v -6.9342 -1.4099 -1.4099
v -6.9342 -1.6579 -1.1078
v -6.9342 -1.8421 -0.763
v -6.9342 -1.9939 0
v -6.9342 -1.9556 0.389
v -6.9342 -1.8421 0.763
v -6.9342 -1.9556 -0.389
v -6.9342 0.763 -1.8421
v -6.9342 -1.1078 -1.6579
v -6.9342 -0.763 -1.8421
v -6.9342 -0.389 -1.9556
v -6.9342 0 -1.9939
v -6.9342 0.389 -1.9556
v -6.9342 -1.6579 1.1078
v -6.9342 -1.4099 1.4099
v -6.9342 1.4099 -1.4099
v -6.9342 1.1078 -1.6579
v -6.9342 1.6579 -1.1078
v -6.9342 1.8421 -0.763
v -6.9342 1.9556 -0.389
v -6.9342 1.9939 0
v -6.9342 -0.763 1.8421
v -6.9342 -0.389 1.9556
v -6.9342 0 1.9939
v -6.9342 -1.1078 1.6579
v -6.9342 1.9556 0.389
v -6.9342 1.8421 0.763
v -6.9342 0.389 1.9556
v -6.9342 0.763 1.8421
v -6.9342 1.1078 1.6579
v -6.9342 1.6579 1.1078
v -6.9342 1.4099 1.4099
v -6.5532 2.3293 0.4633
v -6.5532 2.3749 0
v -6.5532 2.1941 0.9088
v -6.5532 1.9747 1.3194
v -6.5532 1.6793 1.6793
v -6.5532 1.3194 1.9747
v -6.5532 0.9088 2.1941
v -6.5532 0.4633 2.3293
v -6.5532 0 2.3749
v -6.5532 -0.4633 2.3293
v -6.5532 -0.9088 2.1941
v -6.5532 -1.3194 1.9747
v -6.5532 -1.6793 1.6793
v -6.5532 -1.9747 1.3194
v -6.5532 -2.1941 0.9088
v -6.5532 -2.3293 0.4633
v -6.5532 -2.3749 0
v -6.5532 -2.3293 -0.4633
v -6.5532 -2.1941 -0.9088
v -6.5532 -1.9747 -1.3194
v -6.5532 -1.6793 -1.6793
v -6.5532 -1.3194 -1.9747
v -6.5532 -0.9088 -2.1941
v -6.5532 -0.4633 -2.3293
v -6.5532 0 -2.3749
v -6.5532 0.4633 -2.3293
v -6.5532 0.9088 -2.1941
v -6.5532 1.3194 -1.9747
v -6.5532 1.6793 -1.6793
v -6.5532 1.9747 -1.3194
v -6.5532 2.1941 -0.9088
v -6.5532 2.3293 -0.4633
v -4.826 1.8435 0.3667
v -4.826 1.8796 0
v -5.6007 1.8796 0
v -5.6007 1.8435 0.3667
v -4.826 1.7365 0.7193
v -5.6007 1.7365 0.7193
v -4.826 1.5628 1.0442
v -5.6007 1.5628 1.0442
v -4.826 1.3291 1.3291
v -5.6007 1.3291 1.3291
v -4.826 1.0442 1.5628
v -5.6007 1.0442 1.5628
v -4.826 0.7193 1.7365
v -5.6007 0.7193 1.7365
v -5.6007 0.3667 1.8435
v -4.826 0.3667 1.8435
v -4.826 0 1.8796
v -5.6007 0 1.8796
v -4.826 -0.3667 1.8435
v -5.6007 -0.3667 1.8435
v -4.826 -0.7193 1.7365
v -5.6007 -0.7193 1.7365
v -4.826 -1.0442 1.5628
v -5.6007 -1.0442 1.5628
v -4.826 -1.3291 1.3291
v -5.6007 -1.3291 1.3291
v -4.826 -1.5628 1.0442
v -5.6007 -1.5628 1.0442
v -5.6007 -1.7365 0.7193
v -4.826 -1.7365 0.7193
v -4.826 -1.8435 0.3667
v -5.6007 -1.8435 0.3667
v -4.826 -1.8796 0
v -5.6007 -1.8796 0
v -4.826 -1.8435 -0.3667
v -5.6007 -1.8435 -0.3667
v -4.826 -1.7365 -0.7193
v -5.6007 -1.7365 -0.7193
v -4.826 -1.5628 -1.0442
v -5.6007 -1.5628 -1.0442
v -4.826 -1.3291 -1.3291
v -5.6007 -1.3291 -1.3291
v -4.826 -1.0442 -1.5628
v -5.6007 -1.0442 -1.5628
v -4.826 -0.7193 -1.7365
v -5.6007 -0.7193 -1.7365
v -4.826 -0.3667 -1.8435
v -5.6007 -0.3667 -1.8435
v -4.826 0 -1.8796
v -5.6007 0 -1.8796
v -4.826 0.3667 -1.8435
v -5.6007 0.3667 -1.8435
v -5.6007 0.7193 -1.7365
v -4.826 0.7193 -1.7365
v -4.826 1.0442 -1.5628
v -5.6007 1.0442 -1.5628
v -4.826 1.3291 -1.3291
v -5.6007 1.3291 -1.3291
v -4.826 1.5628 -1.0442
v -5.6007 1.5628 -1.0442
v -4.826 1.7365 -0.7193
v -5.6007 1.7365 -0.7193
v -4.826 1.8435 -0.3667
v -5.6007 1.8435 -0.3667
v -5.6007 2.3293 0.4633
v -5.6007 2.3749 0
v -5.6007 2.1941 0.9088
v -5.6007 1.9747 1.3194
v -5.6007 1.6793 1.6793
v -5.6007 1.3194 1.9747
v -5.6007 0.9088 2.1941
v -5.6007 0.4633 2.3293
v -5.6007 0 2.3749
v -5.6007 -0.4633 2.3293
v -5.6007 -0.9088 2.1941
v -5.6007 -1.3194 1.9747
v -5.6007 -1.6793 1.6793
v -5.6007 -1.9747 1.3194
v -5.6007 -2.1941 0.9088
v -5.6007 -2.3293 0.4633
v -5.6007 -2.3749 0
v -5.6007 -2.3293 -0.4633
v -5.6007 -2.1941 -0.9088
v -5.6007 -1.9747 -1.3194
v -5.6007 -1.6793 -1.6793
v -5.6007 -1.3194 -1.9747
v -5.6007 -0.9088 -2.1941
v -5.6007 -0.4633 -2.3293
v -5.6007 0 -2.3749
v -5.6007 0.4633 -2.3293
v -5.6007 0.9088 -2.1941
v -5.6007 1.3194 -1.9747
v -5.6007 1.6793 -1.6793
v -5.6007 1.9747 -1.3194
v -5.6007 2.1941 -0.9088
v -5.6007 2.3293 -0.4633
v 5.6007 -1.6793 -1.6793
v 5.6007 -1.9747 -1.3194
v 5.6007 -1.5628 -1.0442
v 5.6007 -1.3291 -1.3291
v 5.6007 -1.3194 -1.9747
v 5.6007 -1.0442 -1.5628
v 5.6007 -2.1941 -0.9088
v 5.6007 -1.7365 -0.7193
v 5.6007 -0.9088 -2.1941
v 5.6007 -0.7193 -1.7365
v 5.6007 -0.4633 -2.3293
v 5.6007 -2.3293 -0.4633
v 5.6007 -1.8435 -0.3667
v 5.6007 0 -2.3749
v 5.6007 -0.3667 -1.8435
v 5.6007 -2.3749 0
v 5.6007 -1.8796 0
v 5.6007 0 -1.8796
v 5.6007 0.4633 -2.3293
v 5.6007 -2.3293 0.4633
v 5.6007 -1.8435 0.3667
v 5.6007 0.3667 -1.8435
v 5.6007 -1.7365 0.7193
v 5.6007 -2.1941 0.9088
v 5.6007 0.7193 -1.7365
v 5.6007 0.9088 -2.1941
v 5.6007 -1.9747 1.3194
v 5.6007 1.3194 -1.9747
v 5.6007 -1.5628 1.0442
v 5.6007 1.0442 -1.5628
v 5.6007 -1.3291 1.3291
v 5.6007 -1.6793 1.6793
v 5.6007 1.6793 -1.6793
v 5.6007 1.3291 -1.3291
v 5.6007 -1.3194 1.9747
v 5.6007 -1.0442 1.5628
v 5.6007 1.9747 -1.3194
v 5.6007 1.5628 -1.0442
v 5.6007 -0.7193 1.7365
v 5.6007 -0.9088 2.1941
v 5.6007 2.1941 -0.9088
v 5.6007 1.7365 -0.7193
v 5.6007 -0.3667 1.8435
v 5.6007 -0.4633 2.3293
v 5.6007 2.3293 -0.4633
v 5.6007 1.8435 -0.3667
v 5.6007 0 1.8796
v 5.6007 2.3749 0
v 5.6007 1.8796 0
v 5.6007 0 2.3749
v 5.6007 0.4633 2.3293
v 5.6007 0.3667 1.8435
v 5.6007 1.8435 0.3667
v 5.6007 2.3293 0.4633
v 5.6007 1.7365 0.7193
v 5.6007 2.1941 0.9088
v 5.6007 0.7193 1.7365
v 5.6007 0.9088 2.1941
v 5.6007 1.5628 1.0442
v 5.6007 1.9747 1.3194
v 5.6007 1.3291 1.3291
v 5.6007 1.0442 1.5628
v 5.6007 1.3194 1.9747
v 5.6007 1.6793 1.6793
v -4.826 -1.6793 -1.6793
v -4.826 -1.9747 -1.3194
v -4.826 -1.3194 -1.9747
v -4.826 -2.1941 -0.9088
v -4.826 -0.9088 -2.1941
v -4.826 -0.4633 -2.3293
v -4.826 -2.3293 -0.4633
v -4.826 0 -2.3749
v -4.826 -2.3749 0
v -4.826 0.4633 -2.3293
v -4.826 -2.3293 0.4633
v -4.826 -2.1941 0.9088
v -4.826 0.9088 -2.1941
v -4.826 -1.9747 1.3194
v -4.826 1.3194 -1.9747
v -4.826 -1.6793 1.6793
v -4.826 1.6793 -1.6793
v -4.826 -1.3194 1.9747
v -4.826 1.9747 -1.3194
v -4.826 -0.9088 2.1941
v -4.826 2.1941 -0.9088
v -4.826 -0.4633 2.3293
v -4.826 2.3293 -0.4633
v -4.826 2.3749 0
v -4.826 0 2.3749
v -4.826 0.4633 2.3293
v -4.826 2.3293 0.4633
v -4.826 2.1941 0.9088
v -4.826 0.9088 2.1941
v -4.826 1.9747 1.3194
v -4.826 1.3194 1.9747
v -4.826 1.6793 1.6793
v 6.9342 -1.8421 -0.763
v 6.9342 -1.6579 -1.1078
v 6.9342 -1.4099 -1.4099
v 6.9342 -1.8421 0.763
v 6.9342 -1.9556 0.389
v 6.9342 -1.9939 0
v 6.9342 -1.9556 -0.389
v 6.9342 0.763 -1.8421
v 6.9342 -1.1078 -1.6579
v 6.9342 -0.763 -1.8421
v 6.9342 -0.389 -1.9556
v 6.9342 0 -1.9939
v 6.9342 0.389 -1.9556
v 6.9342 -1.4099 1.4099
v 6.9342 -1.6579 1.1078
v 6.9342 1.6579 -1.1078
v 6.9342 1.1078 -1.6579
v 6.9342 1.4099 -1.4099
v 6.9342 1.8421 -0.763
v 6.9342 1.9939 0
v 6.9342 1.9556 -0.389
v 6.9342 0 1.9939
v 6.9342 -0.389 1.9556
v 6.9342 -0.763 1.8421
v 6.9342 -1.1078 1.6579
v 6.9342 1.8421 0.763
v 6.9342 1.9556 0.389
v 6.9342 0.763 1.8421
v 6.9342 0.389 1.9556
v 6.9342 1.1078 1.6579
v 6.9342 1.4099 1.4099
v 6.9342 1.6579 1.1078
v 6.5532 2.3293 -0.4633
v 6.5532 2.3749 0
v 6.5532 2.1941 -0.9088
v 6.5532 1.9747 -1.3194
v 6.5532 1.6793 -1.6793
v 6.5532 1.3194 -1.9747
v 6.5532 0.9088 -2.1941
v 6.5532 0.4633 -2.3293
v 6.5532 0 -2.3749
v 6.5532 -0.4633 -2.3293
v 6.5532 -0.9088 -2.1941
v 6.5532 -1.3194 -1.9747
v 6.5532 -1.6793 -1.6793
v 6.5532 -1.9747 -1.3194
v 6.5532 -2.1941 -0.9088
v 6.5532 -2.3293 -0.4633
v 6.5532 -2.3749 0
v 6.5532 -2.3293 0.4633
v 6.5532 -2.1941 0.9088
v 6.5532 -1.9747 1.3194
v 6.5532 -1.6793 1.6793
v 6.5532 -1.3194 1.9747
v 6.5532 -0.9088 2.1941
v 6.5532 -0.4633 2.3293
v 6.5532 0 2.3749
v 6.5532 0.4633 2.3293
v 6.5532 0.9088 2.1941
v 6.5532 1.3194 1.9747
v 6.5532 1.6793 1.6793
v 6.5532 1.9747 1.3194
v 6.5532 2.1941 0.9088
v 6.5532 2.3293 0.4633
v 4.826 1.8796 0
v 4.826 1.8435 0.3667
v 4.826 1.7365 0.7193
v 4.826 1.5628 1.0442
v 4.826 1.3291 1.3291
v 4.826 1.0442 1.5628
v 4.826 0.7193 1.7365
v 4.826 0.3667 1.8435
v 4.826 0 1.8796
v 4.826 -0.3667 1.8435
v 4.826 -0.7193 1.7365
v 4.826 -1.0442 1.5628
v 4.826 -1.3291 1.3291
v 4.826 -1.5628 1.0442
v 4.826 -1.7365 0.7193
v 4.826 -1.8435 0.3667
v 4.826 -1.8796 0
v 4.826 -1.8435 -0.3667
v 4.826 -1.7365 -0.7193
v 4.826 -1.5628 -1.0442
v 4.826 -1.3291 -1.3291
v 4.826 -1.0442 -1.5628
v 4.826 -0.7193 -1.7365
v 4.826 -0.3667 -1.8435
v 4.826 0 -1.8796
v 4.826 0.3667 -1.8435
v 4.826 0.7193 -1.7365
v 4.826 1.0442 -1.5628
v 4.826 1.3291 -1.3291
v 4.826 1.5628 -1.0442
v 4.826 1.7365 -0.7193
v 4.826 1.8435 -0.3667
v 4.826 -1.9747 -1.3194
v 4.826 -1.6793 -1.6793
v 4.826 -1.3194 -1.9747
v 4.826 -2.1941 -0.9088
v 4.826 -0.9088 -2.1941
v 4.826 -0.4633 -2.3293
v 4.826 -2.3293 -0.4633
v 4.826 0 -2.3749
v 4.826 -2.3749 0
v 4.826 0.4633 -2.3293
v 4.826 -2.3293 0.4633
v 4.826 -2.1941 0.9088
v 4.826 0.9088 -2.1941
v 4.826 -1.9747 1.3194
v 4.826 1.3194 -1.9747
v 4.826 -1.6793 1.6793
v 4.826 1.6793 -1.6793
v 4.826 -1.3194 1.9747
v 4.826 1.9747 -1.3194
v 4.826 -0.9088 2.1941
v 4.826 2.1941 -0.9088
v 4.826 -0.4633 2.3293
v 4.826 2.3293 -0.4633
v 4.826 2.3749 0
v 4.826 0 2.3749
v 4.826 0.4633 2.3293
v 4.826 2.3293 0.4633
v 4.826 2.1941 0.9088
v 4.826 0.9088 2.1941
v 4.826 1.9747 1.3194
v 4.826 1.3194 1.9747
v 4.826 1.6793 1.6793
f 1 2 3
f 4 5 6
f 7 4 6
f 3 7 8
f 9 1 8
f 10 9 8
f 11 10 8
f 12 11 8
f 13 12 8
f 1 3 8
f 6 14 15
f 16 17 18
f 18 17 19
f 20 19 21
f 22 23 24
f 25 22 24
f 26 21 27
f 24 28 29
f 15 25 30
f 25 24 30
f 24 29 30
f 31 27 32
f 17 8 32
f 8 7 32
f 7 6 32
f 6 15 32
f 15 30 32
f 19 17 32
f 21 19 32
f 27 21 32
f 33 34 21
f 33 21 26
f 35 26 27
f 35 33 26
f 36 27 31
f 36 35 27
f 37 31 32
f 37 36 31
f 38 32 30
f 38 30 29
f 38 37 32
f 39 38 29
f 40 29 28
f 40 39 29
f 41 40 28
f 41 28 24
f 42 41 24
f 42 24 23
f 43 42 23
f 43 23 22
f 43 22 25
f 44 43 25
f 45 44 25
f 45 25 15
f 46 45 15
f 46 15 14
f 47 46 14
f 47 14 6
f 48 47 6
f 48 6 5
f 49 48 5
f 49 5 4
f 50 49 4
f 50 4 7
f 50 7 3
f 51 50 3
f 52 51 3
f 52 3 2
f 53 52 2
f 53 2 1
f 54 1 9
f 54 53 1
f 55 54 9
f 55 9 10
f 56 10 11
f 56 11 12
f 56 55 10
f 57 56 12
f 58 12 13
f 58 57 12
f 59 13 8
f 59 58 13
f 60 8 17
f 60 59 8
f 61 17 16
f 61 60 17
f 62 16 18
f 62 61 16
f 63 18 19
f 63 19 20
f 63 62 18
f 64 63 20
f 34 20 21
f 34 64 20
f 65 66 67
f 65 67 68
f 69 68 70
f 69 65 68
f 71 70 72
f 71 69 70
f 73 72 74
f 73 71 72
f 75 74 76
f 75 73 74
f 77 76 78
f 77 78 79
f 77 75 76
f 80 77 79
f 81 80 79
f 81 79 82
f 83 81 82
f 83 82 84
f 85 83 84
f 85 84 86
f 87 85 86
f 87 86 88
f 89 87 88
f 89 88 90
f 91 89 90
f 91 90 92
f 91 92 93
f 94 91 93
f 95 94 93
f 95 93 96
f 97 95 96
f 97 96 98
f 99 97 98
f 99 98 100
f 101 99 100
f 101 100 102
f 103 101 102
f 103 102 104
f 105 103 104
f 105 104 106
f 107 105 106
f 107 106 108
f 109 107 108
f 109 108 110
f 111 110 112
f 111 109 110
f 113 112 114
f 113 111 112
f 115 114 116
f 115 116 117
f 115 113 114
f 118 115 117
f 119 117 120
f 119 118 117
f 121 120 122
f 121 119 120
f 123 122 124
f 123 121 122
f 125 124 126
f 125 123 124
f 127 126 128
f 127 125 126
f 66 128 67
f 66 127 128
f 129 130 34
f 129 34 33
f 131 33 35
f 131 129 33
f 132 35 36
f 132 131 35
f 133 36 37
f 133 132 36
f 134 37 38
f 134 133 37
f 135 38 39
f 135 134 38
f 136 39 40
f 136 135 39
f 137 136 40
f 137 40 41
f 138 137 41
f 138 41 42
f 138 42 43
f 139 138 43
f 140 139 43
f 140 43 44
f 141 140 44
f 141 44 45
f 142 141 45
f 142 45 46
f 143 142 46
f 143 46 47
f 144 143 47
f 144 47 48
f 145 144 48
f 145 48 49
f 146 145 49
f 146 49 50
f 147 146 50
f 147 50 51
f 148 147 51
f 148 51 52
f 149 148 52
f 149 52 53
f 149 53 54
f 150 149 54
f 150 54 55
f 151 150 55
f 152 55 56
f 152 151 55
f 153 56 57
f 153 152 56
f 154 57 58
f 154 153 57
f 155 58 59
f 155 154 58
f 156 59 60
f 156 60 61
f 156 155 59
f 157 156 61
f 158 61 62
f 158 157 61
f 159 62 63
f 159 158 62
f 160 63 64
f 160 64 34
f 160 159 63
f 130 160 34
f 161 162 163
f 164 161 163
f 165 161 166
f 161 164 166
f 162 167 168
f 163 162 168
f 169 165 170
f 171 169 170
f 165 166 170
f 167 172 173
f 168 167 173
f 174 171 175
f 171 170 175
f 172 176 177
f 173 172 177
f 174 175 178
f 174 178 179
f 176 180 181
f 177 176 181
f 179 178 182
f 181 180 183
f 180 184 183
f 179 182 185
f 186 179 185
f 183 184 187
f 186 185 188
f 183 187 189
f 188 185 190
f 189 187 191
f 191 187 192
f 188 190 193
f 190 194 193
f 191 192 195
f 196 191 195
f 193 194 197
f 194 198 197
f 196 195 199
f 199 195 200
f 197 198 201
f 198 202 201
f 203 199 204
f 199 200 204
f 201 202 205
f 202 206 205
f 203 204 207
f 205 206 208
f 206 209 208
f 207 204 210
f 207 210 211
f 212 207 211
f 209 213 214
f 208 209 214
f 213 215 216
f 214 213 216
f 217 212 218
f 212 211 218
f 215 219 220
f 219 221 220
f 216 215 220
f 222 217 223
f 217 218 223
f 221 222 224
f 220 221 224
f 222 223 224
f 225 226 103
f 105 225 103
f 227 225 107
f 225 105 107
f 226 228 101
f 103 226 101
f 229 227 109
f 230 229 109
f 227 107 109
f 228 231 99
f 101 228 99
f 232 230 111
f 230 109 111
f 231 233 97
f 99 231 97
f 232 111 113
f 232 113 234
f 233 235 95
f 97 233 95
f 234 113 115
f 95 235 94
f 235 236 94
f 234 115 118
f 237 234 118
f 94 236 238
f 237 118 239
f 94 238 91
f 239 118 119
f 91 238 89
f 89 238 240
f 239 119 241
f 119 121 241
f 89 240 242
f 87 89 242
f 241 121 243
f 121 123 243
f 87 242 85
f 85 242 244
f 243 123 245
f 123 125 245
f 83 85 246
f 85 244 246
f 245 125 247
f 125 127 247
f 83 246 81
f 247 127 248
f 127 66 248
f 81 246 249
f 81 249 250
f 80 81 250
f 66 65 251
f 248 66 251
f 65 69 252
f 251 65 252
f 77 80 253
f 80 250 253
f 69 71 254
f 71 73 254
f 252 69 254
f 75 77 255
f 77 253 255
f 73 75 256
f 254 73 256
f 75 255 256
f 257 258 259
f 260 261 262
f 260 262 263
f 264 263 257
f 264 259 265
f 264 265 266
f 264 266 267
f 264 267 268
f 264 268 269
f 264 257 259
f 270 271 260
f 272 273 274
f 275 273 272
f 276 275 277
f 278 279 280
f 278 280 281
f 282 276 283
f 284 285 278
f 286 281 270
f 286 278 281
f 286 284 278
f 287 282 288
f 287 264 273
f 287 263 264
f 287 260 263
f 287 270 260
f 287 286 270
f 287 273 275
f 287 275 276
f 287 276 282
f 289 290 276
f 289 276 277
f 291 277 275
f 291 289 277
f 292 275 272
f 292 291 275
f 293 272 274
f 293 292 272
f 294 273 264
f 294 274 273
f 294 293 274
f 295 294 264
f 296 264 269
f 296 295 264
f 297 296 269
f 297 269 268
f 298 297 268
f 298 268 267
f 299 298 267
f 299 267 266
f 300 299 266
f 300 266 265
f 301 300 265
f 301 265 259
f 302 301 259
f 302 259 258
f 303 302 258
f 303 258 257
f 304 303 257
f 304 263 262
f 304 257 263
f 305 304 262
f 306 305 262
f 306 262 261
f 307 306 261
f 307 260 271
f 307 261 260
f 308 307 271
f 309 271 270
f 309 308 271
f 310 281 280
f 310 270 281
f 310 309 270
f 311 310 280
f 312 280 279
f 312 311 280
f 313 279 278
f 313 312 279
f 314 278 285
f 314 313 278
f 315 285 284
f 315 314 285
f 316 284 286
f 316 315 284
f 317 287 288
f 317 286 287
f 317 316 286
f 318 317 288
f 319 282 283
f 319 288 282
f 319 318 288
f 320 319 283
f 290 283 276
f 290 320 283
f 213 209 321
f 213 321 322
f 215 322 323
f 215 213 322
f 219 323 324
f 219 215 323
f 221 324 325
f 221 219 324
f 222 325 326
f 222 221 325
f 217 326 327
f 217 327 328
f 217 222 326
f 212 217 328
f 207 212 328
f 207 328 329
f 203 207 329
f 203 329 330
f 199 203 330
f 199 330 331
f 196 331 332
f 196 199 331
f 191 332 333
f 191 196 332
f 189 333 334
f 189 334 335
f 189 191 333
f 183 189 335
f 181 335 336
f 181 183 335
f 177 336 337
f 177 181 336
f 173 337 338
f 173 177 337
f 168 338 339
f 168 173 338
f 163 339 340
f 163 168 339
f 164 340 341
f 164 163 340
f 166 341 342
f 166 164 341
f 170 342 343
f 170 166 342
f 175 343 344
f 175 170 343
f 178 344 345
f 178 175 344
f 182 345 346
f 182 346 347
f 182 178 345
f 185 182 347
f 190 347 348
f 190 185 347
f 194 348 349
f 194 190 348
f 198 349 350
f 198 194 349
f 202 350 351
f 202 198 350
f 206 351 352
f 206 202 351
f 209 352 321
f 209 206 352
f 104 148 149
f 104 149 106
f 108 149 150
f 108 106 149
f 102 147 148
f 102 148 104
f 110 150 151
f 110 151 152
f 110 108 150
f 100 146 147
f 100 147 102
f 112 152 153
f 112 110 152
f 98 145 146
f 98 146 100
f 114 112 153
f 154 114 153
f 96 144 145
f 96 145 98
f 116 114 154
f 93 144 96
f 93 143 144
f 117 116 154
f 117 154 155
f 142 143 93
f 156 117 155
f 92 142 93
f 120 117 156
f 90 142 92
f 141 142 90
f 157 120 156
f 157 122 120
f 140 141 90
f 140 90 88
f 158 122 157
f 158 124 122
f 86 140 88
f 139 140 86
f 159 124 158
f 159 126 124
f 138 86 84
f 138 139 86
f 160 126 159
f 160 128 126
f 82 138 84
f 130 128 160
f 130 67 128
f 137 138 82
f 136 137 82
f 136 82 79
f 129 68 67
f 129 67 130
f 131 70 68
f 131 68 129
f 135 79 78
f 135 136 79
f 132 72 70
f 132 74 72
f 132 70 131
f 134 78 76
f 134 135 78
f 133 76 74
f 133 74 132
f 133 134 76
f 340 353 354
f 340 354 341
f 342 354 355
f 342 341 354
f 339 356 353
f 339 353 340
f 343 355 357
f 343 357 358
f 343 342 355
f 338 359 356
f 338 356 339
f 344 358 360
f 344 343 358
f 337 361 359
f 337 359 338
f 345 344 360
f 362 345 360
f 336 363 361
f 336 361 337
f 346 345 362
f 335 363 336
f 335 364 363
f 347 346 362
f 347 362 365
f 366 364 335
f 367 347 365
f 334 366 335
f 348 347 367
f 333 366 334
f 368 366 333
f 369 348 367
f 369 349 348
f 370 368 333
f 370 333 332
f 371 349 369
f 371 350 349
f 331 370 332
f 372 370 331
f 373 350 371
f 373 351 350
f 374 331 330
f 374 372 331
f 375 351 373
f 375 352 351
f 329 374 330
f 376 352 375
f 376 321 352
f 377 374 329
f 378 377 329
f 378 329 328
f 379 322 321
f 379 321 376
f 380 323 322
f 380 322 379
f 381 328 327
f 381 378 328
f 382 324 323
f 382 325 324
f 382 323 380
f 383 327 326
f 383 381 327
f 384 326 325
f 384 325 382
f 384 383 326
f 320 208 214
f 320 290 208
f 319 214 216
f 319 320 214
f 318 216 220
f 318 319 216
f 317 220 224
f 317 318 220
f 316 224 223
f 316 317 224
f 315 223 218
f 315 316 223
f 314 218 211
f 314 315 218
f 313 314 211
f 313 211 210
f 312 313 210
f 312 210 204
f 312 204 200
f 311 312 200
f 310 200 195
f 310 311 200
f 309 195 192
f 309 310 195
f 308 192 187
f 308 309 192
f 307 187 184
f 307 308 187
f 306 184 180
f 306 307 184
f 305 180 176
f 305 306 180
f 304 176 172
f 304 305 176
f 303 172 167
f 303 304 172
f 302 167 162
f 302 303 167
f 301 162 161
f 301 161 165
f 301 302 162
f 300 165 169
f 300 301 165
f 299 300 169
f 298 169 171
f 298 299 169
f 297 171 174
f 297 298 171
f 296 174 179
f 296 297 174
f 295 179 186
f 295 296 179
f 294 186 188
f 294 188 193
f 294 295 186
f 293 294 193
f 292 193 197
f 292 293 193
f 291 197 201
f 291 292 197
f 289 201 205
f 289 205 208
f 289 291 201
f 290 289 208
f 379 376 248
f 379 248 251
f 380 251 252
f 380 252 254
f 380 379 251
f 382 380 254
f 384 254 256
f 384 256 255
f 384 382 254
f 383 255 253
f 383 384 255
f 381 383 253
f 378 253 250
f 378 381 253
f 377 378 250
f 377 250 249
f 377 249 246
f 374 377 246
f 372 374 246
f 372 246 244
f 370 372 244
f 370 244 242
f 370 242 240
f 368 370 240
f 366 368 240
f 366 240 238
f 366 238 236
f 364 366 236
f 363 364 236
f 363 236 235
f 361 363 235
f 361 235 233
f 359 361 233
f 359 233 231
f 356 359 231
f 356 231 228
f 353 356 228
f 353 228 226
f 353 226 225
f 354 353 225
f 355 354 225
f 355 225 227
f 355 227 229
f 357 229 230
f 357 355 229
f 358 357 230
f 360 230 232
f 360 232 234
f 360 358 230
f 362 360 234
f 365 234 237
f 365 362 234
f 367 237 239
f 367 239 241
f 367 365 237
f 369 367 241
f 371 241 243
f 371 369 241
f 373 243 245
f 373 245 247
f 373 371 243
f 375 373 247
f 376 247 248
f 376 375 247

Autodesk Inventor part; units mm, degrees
sketch "Sketch_1" plane through (0, 0, 0) normal (0, 0, 1) x (1, 0, 0)
  line L0 (6.9342, 0) -> (-6.9342, 0)
  line L1 (-6.9342, 0) -> (-6.9342, 1.9939)
  line L2 (-6.9342, 1.9939) -> (-6.5532, 2.3749)
  line L3 (-6.5532, 2.3749) -> (-5.6007, 2.3749)
  line L4 (-5.6007, 2.3749) -> (-5.6007, 1.8796)
  line L5 (-5.6007, 1.8796) -> (-4.826, 1.8796)
  line L6 (-4.826, 1.8796) -> (-4.826, 2.3749)
  line L7 (-4.826, 2.3749) -> (4.826, 2.3749)
  line L8 (4.826, 2.3749) -> (4.826, 1.8796)
  line L9 (4.826, 1.8796) -> (5.6007, 1.8796)
  line L10 (5.6007, 1.8796) -> (5.6007, 2.3749)
  line L11 (5.6007, 2.3749) -> (6.5532, 2.3749)
  line L12 (6.5532, 2.3749) -> (6.9342, 1.9939)
  line L13 (6.9342, 1.9939) -> (6.9342, 0)
  line L14 (6.9342, 0) -> (-6.9342, 0)
revolve "Revolution1" add sketch "Sketch_1" angle 360 about axis through (6.9342, 0, 0) along (1, 0, 0)
ref_plane "p1_XY" through (0, 0, 2.3749) normal (1, 0, 0) x (0, 0, -1)
ref_plane "p1_YZ" through (0, 0, 2.3749) normal (0, 0, -1) x (0, 1, 0)
ref_plane "p1_ZX" through (0, 0, 2.3749) normal (0, 1, 0) x (1, 0, 0)
ref_plane "p2_XY" through (0, 0, -2.3749) normal (1, 0, 0) x (0, 0, -1)
ref_plane "p2_YZ" through (0, 0, -2.3749) normal (0, 0, -1) x (0, 1, 0)
ref_plane "p2_ZX" through (0, 0, -2.3749) normal (0, 1, 0) x (1, 0, 0)
ref_plane "pin_XY" through (0, 0, 0) normal (1, 0, 0) x (0, 0, -1)
ref_plane "pin_YZ" through (0, 0, 0) normal (0, 0, -1) x (0, 1, 0)
ref_plane "pin_ZX" through (0, 0, 0) normal (0, 1, 0) x (1, 0, 0)
ref_plane "rr1_XY" through (5.2134, 0, 0) normal (1, 0, 0) x (0, 0, -1)
ref_plane "rr1_YZ" through (5.2134, 0, 0) normal (0, 0, -1) x (0, 1, 0)
ref_plane "rr1_ZX" through (5.2134, 0, 0) normal (0, 1, 0) x (1, 0, 0)
ref_plane "rr2_XY" through (-5.2134, 0, 0) normal (1, 0, 0) x (0, 0, -1)
ref_plane "rr2_YZ" through (-5.2134, 0, 0) normal (0, 0, -1) x (0, 1, 0)
ref_plane "rr2_ZX" through (-5.2134, 0, 0) normal (0, 1, 0) x (1, 0, 0)
ref_plane "w21_XY" through (6.9342, 0, 0) normal (0, 1, 0) x (1, 0, 0)
ref_plane "w21_YZ" through (6.9342, 0, 0) normal (1, 0, 0) x (0, 0, -1)
ref_plane "w21_ZX" through (6.9342, 0, 0) normal (0, 0, -1) x (0, 1, 0)
ref_plane "w22_XY" through (-6.9342, 0, 0) normal (0, 1, 0) x (1, 0, 0)
ref_plane "w22_YZ" through (-6.9342, 0, 0) normal (1, 0, 0) x (0, 0, -1)
ref_plane "w22_ZX" through (-6.9342, 0, 0) normal (0, 0, -1) x (0, 1, 0)
properties part number "D-12304"
